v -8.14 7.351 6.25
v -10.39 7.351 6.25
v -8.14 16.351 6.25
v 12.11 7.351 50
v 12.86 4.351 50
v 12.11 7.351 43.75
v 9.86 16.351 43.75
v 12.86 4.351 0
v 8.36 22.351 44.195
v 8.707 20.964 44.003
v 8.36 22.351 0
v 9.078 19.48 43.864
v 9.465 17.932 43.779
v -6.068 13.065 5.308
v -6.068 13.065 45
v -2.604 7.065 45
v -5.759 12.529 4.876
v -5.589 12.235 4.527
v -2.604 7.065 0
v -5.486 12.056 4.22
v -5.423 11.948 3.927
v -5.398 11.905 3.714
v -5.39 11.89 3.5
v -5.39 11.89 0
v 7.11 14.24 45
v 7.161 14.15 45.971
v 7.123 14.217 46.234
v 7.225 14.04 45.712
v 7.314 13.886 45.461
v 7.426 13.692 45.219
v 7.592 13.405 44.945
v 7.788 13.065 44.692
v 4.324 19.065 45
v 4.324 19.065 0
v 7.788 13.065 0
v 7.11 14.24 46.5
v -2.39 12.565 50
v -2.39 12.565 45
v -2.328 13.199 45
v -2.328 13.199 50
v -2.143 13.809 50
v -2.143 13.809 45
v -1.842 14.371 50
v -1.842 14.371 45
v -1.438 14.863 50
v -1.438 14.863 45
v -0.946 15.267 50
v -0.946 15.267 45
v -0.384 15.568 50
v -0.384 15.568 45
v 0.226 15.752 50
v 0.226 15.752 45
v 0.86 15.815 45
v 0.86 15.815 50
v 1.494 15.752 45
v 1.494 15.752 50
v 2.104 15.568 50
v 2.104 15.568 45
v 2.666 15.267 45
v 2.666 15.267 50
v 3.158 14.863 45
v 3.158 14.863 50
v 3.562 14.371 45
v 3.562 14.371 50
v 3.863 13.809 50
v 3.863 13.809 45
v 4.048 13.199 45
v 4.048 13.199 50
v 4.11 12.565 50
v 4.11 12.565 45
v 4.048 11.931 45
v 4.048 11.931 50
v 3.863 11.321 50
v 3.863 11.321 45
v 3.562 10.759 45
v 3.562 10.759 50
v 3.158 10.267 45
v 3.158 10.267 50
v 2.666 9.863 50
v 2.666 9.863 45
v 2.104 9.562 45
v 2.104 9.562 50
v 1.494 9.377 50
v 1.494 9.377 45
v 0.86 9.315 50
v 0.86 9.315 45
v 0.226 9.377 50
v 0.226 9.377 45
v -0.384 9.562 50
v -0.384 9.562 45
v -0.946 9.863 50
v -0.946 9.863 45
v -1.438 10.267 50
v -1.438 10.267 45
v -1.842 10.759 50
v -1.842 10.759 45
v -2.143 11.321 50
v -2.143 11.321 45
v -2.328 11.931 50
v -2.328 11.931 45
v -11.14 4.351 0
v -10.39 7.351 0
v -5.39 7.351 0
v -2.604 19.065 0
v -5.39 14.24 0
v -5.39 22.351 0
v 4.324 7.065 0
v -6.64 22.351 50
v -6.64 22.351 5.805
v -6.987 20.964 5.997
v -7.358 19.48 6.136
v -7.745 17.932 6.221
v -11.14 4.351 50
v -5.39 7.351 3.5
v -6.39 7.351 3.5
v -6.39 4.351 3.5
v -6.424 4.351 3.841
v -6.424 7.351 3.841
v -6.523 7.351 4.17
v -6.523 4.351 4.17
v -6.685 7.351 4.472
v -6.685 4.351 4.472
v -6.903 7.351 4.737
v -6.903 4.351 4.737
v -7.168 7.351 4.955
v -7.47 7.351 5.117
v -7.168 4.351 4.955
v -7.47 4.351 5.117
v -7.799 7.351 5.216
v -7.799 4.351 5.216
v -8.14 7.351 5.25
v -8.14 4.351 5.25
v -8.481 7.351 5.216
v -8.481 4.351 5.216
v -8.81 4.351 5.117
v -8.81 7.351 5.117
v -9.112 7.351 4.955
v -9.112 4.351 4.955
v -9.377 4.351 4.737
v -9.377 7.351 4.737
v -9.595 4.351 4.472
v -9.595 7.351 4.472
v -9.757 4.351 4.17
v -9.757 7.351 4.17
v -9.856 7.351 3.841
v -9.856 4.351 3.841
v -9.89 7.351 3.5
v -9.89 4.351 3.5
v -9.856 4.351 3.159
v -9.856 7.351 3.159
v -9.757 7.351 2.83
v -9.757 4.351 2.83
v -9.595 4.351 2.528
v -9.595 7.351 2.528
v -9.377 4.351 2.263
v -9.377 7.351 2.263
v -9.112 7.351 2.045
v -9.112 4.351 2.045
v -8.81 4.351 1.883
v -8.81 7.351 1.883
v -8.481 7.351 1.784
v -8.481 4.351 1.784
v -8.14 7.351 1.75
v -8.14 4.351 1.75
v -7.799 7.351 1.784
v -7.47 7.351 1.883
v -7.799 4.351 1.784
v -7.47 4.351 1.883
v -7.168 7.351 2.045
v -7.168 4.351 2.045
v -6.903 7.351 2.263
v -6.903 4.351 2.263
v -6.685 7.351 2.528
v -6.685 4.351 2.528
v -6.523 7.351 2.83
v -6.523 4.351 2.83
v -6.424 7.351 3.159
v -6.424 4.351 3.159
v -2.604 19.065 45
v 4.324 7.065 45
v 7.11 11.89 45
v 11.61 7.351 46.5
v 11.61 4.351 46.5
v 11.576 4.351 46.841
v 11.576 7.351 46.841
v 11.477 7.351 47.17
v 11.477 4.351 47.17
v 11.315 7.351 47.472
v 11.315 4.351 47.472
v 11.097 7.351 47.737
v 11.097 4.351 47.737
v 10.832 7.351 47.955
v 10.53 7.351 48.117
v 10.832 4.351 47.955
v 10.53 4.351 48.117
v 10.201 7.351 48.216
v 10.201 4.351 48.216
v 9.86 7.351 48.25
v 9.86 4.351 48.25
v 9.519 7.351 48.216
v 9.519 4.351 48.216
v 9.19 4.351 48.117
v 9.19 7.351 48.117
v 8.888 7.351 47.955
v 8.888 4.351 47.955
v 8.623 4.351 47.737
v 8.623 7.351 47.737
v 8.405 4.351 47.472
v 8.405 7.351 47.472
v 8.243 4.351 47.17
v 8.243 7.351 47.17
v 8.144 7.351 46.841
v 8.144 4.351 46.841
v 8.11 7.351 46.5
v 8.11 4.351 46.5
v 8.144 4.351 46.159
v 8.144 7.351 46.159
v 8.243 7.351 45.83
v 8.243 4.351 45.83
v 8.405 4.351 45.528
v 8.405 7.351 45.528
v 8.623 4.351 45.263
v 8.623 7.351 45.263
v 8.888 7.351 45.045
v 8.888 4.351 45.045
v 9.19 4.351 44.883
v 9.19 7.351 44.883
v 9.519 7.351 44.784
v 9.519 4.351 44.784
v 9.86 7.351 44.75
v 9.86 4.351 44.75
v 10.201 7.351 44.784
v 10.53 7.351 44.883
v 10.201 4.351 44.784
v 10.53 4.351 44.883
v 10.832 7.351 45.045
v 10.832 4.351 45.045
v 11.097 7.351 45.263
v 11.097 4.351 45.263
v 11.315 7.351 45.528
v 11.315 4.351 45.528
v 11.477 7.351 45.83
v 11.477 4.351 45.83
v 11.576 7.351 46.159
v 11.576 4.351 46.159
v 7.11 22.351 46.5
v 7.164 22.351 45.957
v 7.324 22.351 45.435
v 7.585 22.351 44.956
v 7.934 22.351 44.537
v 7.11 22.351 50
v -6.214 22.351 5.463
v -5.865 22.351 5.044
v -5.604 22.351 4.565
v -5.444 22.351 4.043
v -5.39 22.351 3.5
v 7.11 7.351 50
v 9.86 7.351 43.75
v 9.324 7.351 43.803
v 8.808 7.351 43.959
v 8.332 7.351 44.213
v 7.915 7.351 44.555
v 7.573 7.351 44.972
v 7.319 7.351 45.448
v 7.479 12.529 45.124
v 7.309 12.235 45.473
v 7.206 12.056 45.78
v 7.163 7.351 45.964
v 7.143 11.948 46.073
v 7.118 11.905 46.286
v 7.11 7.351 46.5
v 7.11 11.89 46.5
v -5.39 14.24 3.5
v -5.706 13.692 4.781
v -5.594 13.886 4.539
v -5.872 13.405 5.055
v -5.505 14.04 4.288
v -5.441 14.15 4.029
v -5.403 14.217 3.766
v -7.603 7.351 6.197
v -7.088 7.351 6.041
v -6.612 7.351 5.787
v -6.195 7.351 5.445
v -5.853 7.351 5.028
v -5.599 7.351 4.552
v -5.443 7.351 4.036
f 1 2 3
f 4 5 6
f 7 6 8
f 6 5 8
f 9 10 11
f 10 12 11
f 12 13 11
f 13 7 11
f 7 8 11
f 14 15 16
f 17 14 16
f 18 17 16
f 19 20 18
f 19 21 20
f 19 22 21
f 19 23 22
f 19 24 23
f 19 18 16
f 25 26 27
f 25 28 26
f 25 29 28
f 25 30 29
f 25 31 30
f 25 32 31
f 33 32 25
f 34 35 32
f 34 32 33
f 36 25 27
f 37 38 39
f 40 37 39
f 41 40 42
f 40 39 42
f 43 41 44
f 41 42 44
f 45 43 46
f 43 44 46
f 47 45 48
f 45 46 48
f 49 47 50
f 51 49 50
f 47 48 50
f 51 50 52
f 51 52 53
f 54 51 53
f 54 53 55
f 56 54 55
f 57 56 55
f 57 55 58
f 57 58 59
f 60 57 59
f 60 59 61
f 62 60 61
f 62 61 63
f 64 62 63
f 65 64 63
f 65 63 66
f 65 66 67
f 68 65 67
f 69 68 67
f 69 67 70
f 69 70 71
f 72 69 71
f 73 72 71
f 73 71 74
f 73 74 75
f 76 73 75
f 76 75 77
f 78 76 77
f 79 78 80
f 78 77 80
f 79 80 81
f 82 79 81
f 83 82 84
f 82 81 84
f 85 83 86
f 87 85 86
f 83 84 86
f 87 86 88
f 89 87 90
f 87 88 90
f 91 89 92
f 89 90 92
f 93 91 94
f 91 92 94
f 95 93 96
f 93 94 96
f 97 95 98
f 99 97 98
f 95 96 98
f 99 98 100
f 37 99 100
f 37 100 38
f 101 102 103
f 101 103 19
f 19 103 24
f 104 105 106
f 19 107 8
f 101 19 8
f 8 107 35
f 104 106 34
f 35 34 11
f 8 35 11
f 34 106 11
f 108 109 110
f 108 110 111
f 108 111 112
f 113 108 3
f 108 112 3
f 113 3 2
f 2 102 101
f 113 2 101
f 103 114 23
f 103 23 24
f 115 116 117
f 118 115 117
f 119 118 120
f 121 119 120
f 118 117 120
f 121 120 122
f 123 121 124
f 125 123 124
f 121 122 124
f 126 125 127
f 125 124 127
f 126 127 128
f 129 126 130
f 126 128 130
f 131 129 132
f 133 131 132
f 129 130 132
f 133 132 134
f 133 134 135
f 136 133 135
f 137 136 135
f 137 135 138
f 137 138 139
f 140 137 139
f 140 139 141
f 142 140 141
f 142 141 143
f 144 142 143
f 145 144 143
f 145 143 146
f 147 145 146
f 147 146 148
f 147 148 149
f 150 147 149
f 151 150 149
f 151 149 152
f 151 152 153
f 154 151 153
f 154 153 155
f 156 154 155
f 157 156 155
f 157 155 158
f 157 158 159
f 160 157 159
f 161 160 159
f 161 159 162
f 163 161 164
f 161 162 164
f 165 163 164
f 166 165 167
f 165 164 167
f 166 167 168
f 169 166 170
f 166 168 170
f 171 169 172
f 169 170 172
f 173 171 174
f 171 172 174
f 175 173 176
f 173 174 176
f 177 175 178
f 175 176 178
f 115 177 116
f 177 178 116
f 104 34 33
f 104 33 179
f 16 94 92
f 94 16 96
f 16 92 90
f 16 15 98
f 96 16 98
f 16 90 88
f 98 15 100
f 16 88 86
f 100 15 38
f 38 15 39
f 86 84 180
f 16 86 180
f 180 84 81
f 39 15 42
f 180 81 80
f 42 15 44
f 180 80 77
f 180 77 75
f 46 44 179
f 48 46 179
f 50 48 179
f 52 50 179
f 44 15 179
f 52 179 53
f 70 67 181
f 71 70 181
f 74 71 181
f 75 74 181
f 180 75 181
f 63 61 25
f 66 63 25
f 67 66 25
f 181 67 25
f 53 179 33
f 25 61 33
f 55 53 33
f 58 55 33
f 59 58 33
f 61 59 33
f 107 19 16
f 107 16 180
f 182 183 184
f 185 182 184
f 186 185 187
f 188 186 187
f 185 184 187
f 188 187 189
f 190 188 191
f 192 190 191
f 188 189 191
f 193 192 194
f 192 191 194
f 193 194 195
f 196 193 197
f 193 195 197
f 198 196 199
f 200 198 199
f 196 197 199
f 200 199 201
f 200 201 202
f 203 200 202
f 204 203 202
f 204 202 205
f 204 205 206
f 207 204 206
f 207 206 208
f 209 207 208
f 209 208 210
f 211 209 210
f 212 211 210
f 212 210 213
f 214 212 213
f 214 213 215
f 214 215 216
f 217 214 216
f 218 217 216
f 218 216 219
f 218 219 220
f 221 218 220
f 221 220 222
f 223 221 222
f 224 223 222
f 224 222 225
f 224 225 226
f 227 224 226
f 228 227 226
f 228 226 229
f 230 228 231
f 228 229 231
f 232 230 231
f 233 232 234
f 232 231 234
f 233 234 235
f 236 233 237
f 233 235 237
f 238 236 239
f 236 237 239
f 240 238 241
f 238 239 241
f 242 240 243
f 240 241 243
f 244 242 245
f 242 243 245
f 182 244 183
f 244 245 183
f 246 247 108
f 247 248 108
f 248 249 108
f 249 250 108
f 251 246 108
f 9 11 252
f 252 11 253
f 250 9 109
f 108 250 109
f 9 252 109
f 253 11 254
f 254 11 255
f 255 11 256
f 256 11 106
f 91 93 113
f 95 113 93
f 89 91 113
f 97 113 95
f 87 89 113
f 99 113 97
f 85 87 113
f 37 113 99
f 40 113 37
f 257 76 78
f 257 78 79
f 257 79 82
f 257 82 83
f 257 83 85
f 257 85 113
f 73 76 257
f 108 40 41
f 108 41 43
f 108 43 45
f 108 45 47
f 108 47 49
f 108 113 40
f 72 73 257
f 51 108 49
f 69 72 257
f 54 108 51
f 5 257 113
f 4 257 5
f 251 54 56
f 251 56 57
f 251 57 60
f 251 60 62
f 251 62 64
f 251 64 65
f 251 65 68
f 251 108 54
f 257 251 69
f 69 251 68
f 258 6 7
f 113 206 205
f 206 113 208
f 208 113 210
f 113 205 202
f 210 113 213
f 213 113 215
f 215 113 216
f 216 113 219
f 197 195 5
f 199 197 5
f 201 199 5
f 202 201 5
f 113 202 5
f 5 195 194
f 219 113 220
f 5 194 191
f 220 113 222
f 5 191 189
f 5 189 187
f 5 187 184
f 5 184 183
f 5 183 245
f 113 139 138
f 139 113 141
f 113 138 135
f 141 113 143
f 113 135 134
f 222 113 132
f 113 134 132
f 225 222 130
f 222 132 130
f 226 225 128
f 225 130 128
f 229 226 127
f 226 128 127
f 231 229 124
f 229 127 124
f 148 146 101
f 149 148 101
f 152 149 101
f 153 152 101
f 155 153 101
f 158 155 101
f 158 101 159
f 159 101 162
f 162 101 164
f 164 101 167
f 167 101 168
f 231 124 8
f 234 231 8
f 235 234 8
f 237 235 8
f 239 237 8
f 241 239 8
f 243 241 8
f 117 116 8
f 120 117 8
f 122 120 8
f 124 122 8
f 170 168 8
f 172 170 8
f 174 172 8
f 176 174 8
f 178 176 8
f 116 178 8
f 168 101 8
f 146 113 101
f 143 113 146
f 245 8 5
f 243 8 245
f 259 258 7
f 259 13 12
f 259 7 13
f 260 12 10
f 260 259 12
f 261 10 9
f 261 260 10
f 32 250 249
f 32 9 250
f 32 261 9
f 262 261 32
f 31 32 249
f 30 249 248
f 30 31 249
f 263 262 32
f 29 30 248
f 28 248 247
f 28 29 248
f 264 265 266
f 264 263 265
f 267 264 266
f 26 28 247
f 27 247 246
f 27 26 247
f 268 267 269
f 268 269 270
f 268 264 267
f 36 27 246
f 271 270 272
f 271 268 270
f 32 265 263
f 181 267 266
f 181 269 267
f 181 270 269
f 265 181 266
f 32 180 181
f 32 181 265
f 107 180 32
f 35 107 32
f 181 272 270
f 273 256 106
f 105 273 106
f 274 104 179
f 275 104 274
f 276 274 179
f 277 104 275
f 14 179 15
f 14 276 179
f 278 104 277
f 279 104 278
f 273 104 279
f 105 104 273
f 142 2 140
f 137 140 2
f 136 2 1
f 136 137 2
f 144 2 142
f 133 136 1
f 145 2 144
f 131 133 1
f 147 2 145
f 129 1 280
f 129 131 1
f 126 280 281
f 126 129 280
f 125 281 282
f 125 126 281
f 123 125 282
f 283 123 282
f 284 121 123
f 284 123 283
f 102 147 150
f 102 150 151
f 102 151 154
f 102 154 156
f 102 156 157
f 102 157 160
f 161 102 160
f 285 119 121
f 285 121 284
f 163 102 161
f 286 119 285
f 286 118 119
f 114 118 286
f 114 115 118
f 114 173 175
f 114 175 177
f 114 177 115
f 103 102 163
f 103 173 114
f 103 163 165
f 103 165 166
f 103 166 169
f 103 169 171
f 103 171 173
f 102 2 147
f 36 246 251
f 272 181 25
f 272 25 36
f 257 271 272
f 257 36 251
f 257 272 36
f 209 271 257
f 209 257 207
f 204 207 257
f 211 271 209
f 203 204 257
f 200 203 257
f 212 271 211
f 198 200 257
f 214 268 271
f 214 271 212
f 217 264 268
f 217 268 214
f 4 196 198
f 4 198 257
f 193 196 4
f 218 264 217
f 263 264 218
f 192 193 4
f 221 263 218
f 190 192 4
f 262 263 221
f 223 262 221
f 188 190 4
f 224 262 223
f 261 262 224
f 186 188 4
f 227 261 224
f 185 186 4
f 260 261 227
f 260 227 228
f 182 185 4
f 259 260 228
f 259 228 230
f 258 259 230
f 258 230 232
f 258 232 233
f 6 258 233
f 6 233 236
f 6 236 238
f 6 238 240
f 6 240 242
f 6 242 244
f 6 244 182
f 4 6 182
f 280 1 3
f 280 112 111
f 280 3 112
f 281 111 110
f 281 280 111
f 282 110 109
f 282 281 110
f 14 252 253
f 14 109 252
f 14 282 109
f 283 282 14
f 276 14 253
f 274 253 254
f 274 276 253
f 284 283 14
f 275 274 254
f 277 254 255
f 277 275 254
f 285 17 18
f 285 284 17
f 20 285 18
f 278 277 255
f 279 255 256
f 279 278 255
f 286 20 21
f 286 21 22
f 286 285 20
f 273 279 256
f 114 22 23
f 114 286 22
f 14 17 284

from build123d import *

# Parameters (mm, degrees)
SALIENTE_EXTRUIR1_DEPTH = 50
CROQUIS3_R              = 1.75
CORTAR_EXTRUIR1_DEPTH   = 50
CORTAR_EXTRUIR2_DEPTH   = 50
CROQUIS5_W              = 13.75
CROQUIS5_H              = 15.668518787
SALIENTE_EXTRUIR2_DEPTH = 5
CROQUIS6_R              = 3.25
CORTAR_EXTRUIR3_DEPTH   = 51


with BuildPart() as part:
    # Croquis1 → Saliente-Extruir1 (new body)
    with BuildSketch(Plane.XY):
        Polygon((-11.139985082, 4.35106383), (12.860014918, 4.35106383), (8.360014918, 22.35106383), (-6.639985082, 22.35106383), align=None)
        Polygon((-6.068188312, 13.064935956), (-2.604086697, 7.064935956), (4.324116534, 7.064935956), (7.788218149, 13.064935956), (4.324116534, 19.064935956), (-2.604086697, 19.064935956), align=None, mode=Mode.SUBTRACT)
    extrude(amount=SALIENTE_EXTRUIR1_DEPTH)

    # Croquis3 → Cortar-Extruir1 (cut)
    with BuildSketch(Plane.XZ.offset(-4.35106383)):
        with Locations((-8.139985082, 3.5)):
            Circle(CROQUIS3_R)
        with Locations((9.860014918, 46.5)):
            Circle(CROQUIS3_R)
    extrude(amount=-CORTAR_EXTRUIR1_DEPTH, mode=Mode.SUBTRACT)

    # Croquis4 → Cortar-Extruir2 (cut)
    with BuildSketch(Plane(origin=(0, 7.35106383, 0), x_dir=(-1, 0, 0), z_dir=(0, -1, 0))):
        with BuildLine():
            Line((-18.110014918, -43.75), (-9.860014918, -43.75))
            ThreePointArc((-9.860014918, -43.75), (-7.91547127, -44.555456352), (-7.110014918, -46.5))
            Line((-7.110014918, -46.5), (-7.110014918, -54.75))
            Line((-7.110014918, -54.75), (-18.110014918, -54.75))
            Line((-18.110014918, -54.75), (-18.110014918, -43.75))
        make_face()
        with BuildLine():
            Line((16.389985082, -6.25), (8.139985082, -6.25))
            ThreePointArc((8.139985082, -6.25), (6.195441433, -5.444543648), (5.389985082, -3.5))
            Line((5.389985082, -3.5), (5.389985082, 4.75))
            Line((5.389985082, 4.75), (16.389985082, 4.75))
            Line((16.389985082, 4.75), (16.389985082, -6.25))
        make_face()
    extrude(amount=-CORTAR_EXTRUIR2_DEPTH, mode=Mode.SUBTRACT)

    # Croquis5 → Saliente-Extruir2 (add)
    with BuildSketch(Plane.XY.offset(50)):
        with Locations((0.235014918, 14.516804437)):
            Rectangle(CROQUIS5_W, CROQUIS5_H)
    extrude(amount=-SALIENTE_EXTRUIR2_DEPTH)

    # Croquis6 → Cortar-Extruir3 (cut, through all)
    with BuildSketch(Plane(origin=(0, 0, 0), x_dir=(-1, 0, 0), z_dir=(0, 0, -1))):
        with Locations((-0.860014918, 12.564935956)):
            Circle(CROQUIS6_R)
    extrude(amount=-CORTAR_EXTRUIR3_DEPTH, mode=Mode.SUBTRACT)


solid = part.part
